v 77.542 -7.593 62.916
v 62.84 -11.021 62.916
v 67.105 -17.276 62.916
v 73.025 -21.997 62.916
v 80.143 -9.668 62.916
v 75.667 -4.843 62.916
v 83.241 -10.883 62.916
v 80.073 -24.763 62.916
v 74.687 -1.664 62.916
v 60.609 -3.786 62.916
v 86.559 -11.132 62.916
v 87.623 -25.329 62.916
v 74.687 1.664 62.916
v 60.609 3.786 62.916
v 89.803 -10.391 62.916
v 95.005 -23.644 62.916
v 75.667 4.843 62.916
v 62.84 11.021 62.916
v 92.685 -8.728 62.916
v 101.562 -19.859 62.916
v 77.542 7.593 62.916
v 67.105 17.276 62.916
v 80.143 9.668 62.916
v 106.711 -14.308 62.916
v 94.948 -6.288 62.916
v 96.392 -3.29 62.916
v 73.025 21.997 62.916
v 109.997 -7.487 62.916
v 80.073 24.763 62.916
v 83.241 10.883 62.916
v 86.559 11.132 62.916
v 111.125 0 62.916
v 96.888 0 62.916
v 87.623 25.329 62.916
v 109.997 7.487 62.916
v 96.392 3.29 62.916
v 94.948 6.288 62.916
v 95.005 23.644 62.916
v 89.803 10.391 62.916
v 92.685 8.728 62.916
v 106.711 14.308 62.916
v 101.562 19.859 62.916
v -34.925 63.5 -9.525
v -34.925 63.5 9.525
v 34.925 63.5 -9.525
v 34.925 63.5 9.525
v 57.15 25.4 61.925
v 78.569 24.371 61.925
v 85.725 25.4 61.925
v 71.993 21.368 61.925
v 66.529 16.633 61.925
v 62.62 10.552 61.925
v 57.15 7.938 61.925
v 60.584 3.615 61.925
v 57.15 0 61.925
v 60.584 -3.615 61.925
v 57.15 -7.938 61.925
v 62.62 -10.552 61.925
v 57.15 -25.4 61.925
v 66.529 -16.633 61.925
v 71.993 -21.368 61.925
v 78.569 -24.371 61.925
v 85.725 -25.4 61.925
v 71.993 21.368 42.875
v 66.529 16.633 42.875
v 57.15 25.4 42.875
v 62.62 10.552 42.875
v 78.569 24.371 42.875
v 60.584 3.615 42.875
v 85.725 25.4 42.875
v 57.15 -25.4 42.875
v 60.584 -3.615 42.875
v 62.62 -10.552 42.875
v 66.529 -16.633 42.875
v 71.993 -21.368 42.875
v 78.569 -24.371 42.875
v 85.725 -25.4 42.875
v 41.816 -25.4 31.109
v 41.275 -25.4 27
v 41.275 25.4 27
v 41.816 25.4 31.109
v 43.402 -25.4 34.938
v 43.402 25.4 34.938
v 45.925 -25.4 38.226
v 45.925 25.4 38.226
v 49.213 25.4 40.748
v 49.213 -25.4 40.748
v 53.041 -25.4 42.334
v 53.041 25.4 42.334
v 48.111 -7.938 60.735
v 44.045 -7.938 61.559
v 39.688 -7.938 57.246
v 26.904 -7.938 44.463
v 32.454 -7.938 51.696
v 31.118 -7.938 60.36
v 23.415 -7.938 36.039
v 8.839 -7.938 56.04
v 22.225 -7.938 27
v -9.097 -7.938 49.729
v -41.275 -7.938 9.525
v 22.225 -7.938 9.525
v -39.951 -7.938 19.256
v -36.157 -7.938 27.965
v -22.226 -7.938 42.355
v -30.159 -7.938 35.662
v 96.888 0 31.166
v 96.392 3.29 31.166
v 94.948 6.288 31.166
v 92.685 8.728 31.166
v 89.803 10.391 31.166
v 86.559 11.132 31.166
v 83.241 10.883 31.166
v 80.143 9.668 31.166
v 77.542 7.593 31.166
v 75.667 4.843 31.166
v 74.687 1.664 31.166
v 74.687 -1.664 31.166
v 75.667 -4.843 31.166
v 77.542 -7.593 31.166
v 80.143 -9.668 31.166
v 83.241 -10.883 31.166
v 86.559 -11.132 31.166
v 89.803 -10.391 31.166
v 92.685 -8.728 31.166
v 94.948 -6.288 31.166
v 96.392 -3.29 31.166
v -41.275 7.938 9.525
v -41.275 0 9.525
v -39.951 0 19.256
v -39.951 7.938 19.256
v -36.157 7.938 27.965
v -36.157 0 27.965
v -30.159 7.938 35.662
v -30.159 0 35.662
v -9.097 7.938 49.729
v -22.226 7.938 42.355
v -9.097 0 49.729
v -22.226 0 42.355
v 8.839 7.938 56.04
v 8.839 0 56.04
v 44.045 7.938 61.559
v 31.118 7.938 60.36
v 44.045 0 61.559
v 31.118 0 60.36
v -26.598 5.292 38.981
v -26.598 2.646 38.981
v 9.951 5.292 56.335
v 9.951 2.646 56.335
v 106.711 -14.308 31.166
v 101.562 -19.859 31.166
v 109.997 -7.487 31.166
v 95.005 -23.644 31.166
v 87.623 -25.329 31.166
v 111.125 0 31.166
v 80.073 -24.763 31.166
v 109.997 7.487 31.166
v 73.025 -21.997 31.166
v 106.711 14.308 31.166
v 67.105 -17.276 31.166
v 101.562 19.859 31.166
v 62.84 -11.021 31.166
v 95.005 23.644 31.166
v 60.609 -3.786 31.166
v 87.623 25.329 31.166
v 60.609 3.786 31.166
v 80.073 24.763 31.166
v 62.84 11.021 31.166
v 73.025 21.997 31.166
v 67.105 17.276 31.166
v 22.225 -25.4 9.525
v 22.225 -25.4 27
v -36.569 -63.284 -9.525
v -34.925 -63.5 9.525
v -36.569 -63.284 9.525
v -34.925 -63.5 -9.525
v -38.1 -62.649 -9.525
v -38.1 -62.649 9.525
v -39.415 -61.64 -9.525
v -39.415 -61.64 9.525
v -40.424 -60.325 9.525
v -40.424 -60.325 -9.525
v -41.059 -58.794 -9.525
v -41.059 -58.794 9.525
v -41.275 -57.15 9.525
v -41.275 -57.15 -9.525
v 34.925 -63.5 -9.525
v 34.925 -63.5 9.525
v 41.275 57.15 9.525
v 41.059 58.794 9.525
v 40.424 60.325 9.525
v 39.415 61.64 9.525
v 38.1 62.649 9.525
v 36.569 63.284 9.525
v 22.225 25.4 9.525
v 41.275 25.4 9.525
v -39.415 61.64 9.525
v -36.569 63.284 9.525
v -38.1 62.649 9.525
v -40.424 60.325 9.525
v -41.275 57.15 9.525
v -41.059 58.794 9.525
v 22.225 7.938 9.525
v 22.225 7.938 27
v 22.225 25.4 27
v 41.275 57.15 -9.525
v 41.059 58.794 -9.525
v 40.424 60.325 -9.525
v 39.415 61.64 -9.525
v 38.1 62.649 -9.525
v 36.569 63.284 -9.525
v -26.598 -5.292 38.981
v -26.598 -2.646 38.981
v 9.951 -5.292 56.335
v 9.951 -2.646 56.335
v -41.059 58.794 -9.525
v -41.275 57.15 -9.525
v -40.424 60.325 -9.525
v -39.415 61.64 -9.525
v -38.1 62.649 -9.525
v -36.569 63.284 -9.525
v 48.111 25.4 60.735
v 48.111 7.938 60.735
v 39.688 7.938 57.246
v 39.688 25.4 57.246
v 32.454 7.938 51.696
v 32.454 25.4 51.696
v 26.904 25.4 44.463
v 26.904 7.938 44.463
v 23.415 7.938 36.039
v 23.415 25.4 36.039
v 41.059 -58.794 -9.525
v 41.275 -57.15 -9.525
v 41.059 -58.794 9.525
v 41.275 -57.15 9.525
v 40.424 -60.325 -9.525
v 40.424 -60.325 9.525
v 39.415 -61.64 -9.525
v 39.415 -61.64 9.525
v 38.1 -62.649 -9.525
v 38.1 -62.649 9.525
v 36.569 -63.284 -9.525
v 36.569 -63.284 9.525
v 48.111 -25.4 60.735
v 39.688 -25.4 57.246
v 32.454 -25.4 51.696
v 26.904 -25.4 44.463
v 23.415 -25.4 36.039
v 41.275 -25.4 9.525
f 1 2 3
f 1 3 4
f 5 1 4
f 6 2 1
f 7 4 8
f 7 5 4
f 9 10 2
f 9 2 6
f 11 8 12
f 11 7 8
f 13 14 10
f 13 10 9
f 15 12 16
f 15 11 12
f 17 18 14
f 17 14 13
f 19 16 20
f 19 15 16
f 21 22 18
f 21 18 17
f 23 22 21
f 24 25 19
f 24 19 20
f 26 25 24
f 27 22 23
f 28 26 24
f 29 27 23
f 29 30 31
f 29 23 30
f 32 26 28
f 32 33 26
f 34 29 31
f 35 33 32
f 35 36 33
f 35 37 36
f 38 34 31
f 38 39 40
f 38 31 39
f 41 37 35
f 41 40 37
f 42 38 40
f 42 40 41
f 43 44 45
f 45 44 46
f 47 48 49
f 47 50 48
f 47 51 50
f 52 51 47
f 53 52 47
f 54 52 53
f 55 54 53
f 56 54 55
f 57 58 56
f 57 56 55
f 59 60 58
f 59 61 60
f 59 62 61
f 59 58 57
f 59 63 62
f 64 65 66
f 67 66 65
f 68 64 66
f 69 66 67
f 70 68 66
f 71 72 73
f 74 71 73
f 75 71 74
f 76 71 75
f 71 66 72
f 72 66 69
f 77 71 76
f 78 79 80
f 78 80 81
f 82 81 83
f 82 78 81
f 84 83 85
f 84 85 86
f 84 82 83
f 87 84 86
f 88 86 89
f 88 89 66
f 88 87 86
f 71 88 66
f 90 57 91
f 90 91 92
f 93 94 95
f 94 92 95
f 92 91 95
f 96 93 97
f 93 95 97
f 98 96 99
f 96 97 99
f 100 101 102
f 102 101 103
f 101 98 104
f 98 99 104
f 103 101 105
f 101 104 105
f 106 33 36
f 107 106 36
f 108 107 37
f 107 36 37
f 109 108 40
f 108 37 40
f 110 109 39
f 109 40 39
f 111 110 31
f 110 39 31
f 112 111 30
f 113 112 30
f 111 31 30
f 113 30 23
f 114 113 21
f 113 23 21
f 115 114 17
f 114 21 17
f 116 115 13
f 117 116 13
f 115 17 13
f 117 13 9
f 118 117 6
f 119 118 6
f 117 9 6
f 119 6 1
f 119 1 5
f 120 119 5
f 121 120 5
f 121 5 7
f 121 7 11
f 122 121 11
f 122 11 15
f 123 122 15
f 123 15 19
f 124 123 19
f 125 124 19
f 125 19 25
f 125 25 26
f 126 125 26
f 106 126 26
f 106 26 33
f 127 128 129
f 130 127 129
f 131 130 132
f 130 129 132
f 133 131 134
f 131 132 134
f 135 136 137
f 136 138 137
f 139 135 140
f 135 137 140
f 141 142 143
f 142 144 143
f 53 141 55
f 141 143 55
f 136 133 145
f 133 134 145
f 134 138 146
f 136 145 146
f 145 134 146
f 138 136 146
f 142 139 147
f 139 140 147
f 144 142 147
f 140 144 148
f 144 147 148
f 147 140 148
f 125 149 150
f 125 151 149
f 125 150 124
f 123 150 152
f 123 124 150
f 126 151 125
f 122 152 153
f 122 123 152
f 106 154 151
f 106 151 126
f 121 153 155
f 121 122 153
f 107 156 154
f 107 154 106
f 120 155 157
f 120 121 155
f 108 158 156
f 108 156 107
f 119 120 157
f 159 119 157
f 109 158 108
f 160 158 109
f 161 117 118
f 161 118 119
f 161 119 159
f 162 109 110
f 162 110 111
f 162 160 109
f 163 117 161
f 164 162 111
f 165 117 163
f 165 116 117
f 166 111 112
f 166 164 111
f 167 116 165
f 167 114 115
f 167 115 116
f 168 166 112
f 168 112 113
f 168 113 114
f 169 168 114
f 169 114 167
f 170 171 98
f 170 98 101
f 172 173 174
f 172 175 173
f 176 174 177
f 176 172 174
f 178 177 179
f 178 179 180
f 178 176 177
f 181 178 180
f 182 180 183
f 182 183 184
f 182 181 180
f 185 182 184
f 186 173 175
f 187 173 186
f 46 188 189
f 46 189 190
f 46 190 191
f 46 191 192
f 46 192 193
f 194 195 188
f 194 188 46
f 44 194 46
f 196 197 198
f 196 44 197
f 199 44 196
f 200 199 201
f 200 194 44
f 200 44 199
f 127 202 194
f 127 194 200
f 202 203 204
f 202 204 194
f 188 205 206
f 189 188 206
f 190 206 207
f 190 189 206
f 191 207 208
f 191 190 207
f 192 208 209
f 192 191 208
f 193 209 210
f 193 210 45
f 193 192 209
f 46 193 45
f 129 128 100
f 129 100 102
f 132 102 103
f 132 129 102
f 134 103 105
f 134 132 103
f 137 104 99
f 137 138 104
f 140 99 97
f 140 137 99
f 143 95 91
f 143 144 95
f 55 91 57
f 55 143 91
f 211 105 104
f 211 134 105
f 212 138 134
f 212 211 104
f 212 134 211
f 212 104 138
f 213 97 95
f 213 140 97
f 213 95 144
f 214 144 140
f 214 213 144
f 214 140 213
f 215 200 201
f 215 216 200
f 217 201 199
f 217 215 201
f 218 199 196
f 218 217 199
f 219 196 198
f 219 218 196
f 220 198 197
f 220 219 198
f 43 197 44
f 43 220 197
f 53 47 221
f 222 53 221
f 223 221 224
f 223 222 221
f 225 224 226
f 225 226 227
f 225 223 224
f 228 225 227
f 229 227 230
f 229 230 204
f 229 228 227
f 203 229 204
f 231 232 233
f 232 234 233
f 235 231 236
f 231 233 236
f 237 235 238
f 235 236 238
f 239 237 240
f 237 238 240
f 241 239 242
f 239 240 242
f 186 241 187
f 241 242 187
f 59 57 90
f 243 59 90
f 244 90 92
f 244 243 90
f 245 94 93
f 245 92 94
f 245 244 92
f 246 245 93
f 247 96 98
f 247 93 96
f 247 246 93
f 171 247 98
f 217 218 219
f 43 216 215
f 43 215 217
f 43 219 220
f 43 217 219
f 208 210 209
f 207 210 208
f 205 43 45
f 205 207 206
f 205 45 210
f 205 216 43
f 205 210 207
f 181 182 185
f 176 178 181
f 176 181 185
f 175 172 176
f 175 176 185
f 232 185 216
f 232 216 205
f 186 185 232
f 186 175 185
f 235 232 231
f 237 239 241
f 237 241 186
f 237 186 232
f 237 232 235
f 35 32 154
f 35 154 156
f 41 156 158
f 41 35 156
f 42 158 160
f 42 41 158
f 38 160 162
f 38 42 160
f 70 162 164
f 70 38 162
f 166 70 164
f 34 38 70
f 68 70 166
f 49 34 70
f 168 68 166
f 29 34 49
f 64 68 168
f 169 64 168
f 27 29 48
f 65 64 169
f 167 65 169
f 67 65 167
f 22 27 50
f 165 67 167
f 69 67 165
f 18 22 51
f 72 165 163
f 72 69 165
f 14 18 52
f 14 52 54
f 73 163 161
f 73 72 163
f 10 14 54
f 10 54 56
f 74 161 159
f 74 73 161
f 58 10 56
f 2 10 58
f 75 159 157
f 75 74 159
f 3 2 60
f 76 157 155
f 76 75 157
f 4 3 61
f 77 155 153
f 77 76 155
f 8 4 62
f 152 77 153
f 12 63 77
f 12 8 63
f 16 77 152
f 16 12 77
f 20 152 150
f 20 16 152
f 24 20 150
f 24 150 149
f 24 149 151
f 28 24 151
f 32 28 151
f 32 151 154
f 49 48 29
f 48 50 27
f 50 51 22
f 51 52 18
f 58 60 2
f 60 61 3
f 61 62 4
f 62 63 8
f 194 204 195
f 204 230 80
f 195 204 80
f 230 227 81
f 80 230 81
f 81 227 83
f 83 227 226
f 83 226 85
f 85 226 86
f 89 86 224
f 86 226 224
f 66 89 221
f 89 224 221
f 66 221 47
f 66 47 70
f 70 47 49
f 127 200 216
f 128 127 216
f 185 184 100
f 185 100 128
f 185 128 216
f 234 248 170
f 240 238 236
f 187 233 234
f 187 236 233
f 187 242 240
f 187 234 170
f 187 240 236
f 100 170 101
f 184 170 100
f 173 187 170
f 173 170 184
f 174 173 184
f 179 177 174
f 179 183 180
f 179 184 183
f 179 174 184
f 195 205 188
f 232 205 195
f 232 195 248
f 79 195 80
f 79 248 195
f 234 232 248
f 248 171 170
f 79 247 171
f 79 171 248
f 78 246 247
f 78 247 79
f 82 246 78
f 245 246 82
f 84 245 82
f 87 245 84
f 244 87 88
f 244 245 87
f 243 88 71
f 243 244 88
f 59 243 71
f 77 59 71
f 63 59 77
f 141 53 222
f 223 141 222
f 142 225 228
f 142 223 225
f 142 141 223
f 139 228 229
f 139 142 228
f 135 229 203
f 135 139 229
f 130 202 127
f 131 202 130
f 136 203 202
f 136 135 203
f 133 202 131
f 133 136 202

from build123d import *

# Parameters (mm, degrees)
F1_DEPTH = 63.5
F0_W     = 25.4
F0_H     = 19.05
F2_DEPTH = 25.4
F3_DEPTH = 7.9375
F5_R     = 6.35
F6_R     = 11.1630975277
F7_DEPTH = 35


with BuildPart() as f1:
    # F0 (on Front) → F1 (new body, symmetric)
    with BuildSketch(Plane.XZ):
        Polygon((22.225, 9.525), (-41.275, 9.525), (-41.275, -9.525), (41.275, -9.525), (41.275, 9.525), align=None)
    extrude(amount=F1_DEPTH, both=True)

    # F0 (on Front) → F2 (join, symmetric)
    with BuildSketch(Plane.XZ):
        with BuildLine():
            Line((22.225, 27.0002), (22.225, 9.525))
            Line((22.225, 9.525), (41.275, 9.525))
            Line((41.275, 9.525), (41.275, 27.0002))
            ThreePointArc((41.275, 27.0002), (45.9246798487, 38.2255201513), (57.15, 42.8752))
            Line((57.15, 42.8752), (60.325, 42.8752))
            Line((60.325, 42.8752), (60.325, 61.9252))
            Line((60.325, 61.9252), (57.15, 61.9252))
            ThreePointArc((57.15, 61.9252), (32.4542956671, 51.6959043329), (22.225, 27.0002))
        make_face()
        with Locations((73.025, 52.4002)):
            Rectangle(F0_W, F0_H)
    extrude(amount=F2_DEPTH, both=True)

    # F0 (on Front) → F3 (join, symmetric)
    with BuildSketch(Plane.XZ):
        with BuildLine():
            add(Edge.make_bspline(
                [(-41.275, 9.525), (-41.275, 45.1444163918), (8.36633984, 62.1046647429), (57.15, 61.9252)],
                knots=[0, 0, 0, 0, 111.5045361635, 111.5045361635, 111.5045361635, 111.5045361635], degree=3))
            Line((-41.275, 9.525), (22.225, 9.525))
            Line((22.225, 9.525), (22.225, 27.0002))
            ThreePointArc((22.225, 27.0002), (32.4542956671, 51.6959043329), (57.15, 61.9252))
        make_face()
    extrude(amount=F3_DEPTH, both=True)

    # F0 (on Front) → F4 (revolve)
    with BuildSketch(Plane.XZ):
        Polygon((85.725, 62.9158), (85.725, 61.9252), (85.725, 42.8752), (85.725, 31.1658), (111.125, 31.1658), (111.125, 62.9158), align=None)
    revolve(axis=Axis((85.725, 0, 47.0408), (0, 0, 1)))

    # F5
    f5_edges = [f1.edges().sort_by_distance(p)[0] for p in [
        (41.275, 63.5, 0),
        (-41.275, 63.5, 0),
        (-41.275, -63.5, 0),
        (41.275, -63.5, 0),
    ]]
    fillet(f5_edges, radius=F5_R)

    # F6 (on face) → F7 (cut)
    with BuildSketch(Plane.XY.offset(62.9158)):
        with Locations((85.725, 0)):
            Circle(F6_R)
    extrude(amount=-F7_DEPTH, mode=Mode.SUBTRACT)


solid = f1.part
